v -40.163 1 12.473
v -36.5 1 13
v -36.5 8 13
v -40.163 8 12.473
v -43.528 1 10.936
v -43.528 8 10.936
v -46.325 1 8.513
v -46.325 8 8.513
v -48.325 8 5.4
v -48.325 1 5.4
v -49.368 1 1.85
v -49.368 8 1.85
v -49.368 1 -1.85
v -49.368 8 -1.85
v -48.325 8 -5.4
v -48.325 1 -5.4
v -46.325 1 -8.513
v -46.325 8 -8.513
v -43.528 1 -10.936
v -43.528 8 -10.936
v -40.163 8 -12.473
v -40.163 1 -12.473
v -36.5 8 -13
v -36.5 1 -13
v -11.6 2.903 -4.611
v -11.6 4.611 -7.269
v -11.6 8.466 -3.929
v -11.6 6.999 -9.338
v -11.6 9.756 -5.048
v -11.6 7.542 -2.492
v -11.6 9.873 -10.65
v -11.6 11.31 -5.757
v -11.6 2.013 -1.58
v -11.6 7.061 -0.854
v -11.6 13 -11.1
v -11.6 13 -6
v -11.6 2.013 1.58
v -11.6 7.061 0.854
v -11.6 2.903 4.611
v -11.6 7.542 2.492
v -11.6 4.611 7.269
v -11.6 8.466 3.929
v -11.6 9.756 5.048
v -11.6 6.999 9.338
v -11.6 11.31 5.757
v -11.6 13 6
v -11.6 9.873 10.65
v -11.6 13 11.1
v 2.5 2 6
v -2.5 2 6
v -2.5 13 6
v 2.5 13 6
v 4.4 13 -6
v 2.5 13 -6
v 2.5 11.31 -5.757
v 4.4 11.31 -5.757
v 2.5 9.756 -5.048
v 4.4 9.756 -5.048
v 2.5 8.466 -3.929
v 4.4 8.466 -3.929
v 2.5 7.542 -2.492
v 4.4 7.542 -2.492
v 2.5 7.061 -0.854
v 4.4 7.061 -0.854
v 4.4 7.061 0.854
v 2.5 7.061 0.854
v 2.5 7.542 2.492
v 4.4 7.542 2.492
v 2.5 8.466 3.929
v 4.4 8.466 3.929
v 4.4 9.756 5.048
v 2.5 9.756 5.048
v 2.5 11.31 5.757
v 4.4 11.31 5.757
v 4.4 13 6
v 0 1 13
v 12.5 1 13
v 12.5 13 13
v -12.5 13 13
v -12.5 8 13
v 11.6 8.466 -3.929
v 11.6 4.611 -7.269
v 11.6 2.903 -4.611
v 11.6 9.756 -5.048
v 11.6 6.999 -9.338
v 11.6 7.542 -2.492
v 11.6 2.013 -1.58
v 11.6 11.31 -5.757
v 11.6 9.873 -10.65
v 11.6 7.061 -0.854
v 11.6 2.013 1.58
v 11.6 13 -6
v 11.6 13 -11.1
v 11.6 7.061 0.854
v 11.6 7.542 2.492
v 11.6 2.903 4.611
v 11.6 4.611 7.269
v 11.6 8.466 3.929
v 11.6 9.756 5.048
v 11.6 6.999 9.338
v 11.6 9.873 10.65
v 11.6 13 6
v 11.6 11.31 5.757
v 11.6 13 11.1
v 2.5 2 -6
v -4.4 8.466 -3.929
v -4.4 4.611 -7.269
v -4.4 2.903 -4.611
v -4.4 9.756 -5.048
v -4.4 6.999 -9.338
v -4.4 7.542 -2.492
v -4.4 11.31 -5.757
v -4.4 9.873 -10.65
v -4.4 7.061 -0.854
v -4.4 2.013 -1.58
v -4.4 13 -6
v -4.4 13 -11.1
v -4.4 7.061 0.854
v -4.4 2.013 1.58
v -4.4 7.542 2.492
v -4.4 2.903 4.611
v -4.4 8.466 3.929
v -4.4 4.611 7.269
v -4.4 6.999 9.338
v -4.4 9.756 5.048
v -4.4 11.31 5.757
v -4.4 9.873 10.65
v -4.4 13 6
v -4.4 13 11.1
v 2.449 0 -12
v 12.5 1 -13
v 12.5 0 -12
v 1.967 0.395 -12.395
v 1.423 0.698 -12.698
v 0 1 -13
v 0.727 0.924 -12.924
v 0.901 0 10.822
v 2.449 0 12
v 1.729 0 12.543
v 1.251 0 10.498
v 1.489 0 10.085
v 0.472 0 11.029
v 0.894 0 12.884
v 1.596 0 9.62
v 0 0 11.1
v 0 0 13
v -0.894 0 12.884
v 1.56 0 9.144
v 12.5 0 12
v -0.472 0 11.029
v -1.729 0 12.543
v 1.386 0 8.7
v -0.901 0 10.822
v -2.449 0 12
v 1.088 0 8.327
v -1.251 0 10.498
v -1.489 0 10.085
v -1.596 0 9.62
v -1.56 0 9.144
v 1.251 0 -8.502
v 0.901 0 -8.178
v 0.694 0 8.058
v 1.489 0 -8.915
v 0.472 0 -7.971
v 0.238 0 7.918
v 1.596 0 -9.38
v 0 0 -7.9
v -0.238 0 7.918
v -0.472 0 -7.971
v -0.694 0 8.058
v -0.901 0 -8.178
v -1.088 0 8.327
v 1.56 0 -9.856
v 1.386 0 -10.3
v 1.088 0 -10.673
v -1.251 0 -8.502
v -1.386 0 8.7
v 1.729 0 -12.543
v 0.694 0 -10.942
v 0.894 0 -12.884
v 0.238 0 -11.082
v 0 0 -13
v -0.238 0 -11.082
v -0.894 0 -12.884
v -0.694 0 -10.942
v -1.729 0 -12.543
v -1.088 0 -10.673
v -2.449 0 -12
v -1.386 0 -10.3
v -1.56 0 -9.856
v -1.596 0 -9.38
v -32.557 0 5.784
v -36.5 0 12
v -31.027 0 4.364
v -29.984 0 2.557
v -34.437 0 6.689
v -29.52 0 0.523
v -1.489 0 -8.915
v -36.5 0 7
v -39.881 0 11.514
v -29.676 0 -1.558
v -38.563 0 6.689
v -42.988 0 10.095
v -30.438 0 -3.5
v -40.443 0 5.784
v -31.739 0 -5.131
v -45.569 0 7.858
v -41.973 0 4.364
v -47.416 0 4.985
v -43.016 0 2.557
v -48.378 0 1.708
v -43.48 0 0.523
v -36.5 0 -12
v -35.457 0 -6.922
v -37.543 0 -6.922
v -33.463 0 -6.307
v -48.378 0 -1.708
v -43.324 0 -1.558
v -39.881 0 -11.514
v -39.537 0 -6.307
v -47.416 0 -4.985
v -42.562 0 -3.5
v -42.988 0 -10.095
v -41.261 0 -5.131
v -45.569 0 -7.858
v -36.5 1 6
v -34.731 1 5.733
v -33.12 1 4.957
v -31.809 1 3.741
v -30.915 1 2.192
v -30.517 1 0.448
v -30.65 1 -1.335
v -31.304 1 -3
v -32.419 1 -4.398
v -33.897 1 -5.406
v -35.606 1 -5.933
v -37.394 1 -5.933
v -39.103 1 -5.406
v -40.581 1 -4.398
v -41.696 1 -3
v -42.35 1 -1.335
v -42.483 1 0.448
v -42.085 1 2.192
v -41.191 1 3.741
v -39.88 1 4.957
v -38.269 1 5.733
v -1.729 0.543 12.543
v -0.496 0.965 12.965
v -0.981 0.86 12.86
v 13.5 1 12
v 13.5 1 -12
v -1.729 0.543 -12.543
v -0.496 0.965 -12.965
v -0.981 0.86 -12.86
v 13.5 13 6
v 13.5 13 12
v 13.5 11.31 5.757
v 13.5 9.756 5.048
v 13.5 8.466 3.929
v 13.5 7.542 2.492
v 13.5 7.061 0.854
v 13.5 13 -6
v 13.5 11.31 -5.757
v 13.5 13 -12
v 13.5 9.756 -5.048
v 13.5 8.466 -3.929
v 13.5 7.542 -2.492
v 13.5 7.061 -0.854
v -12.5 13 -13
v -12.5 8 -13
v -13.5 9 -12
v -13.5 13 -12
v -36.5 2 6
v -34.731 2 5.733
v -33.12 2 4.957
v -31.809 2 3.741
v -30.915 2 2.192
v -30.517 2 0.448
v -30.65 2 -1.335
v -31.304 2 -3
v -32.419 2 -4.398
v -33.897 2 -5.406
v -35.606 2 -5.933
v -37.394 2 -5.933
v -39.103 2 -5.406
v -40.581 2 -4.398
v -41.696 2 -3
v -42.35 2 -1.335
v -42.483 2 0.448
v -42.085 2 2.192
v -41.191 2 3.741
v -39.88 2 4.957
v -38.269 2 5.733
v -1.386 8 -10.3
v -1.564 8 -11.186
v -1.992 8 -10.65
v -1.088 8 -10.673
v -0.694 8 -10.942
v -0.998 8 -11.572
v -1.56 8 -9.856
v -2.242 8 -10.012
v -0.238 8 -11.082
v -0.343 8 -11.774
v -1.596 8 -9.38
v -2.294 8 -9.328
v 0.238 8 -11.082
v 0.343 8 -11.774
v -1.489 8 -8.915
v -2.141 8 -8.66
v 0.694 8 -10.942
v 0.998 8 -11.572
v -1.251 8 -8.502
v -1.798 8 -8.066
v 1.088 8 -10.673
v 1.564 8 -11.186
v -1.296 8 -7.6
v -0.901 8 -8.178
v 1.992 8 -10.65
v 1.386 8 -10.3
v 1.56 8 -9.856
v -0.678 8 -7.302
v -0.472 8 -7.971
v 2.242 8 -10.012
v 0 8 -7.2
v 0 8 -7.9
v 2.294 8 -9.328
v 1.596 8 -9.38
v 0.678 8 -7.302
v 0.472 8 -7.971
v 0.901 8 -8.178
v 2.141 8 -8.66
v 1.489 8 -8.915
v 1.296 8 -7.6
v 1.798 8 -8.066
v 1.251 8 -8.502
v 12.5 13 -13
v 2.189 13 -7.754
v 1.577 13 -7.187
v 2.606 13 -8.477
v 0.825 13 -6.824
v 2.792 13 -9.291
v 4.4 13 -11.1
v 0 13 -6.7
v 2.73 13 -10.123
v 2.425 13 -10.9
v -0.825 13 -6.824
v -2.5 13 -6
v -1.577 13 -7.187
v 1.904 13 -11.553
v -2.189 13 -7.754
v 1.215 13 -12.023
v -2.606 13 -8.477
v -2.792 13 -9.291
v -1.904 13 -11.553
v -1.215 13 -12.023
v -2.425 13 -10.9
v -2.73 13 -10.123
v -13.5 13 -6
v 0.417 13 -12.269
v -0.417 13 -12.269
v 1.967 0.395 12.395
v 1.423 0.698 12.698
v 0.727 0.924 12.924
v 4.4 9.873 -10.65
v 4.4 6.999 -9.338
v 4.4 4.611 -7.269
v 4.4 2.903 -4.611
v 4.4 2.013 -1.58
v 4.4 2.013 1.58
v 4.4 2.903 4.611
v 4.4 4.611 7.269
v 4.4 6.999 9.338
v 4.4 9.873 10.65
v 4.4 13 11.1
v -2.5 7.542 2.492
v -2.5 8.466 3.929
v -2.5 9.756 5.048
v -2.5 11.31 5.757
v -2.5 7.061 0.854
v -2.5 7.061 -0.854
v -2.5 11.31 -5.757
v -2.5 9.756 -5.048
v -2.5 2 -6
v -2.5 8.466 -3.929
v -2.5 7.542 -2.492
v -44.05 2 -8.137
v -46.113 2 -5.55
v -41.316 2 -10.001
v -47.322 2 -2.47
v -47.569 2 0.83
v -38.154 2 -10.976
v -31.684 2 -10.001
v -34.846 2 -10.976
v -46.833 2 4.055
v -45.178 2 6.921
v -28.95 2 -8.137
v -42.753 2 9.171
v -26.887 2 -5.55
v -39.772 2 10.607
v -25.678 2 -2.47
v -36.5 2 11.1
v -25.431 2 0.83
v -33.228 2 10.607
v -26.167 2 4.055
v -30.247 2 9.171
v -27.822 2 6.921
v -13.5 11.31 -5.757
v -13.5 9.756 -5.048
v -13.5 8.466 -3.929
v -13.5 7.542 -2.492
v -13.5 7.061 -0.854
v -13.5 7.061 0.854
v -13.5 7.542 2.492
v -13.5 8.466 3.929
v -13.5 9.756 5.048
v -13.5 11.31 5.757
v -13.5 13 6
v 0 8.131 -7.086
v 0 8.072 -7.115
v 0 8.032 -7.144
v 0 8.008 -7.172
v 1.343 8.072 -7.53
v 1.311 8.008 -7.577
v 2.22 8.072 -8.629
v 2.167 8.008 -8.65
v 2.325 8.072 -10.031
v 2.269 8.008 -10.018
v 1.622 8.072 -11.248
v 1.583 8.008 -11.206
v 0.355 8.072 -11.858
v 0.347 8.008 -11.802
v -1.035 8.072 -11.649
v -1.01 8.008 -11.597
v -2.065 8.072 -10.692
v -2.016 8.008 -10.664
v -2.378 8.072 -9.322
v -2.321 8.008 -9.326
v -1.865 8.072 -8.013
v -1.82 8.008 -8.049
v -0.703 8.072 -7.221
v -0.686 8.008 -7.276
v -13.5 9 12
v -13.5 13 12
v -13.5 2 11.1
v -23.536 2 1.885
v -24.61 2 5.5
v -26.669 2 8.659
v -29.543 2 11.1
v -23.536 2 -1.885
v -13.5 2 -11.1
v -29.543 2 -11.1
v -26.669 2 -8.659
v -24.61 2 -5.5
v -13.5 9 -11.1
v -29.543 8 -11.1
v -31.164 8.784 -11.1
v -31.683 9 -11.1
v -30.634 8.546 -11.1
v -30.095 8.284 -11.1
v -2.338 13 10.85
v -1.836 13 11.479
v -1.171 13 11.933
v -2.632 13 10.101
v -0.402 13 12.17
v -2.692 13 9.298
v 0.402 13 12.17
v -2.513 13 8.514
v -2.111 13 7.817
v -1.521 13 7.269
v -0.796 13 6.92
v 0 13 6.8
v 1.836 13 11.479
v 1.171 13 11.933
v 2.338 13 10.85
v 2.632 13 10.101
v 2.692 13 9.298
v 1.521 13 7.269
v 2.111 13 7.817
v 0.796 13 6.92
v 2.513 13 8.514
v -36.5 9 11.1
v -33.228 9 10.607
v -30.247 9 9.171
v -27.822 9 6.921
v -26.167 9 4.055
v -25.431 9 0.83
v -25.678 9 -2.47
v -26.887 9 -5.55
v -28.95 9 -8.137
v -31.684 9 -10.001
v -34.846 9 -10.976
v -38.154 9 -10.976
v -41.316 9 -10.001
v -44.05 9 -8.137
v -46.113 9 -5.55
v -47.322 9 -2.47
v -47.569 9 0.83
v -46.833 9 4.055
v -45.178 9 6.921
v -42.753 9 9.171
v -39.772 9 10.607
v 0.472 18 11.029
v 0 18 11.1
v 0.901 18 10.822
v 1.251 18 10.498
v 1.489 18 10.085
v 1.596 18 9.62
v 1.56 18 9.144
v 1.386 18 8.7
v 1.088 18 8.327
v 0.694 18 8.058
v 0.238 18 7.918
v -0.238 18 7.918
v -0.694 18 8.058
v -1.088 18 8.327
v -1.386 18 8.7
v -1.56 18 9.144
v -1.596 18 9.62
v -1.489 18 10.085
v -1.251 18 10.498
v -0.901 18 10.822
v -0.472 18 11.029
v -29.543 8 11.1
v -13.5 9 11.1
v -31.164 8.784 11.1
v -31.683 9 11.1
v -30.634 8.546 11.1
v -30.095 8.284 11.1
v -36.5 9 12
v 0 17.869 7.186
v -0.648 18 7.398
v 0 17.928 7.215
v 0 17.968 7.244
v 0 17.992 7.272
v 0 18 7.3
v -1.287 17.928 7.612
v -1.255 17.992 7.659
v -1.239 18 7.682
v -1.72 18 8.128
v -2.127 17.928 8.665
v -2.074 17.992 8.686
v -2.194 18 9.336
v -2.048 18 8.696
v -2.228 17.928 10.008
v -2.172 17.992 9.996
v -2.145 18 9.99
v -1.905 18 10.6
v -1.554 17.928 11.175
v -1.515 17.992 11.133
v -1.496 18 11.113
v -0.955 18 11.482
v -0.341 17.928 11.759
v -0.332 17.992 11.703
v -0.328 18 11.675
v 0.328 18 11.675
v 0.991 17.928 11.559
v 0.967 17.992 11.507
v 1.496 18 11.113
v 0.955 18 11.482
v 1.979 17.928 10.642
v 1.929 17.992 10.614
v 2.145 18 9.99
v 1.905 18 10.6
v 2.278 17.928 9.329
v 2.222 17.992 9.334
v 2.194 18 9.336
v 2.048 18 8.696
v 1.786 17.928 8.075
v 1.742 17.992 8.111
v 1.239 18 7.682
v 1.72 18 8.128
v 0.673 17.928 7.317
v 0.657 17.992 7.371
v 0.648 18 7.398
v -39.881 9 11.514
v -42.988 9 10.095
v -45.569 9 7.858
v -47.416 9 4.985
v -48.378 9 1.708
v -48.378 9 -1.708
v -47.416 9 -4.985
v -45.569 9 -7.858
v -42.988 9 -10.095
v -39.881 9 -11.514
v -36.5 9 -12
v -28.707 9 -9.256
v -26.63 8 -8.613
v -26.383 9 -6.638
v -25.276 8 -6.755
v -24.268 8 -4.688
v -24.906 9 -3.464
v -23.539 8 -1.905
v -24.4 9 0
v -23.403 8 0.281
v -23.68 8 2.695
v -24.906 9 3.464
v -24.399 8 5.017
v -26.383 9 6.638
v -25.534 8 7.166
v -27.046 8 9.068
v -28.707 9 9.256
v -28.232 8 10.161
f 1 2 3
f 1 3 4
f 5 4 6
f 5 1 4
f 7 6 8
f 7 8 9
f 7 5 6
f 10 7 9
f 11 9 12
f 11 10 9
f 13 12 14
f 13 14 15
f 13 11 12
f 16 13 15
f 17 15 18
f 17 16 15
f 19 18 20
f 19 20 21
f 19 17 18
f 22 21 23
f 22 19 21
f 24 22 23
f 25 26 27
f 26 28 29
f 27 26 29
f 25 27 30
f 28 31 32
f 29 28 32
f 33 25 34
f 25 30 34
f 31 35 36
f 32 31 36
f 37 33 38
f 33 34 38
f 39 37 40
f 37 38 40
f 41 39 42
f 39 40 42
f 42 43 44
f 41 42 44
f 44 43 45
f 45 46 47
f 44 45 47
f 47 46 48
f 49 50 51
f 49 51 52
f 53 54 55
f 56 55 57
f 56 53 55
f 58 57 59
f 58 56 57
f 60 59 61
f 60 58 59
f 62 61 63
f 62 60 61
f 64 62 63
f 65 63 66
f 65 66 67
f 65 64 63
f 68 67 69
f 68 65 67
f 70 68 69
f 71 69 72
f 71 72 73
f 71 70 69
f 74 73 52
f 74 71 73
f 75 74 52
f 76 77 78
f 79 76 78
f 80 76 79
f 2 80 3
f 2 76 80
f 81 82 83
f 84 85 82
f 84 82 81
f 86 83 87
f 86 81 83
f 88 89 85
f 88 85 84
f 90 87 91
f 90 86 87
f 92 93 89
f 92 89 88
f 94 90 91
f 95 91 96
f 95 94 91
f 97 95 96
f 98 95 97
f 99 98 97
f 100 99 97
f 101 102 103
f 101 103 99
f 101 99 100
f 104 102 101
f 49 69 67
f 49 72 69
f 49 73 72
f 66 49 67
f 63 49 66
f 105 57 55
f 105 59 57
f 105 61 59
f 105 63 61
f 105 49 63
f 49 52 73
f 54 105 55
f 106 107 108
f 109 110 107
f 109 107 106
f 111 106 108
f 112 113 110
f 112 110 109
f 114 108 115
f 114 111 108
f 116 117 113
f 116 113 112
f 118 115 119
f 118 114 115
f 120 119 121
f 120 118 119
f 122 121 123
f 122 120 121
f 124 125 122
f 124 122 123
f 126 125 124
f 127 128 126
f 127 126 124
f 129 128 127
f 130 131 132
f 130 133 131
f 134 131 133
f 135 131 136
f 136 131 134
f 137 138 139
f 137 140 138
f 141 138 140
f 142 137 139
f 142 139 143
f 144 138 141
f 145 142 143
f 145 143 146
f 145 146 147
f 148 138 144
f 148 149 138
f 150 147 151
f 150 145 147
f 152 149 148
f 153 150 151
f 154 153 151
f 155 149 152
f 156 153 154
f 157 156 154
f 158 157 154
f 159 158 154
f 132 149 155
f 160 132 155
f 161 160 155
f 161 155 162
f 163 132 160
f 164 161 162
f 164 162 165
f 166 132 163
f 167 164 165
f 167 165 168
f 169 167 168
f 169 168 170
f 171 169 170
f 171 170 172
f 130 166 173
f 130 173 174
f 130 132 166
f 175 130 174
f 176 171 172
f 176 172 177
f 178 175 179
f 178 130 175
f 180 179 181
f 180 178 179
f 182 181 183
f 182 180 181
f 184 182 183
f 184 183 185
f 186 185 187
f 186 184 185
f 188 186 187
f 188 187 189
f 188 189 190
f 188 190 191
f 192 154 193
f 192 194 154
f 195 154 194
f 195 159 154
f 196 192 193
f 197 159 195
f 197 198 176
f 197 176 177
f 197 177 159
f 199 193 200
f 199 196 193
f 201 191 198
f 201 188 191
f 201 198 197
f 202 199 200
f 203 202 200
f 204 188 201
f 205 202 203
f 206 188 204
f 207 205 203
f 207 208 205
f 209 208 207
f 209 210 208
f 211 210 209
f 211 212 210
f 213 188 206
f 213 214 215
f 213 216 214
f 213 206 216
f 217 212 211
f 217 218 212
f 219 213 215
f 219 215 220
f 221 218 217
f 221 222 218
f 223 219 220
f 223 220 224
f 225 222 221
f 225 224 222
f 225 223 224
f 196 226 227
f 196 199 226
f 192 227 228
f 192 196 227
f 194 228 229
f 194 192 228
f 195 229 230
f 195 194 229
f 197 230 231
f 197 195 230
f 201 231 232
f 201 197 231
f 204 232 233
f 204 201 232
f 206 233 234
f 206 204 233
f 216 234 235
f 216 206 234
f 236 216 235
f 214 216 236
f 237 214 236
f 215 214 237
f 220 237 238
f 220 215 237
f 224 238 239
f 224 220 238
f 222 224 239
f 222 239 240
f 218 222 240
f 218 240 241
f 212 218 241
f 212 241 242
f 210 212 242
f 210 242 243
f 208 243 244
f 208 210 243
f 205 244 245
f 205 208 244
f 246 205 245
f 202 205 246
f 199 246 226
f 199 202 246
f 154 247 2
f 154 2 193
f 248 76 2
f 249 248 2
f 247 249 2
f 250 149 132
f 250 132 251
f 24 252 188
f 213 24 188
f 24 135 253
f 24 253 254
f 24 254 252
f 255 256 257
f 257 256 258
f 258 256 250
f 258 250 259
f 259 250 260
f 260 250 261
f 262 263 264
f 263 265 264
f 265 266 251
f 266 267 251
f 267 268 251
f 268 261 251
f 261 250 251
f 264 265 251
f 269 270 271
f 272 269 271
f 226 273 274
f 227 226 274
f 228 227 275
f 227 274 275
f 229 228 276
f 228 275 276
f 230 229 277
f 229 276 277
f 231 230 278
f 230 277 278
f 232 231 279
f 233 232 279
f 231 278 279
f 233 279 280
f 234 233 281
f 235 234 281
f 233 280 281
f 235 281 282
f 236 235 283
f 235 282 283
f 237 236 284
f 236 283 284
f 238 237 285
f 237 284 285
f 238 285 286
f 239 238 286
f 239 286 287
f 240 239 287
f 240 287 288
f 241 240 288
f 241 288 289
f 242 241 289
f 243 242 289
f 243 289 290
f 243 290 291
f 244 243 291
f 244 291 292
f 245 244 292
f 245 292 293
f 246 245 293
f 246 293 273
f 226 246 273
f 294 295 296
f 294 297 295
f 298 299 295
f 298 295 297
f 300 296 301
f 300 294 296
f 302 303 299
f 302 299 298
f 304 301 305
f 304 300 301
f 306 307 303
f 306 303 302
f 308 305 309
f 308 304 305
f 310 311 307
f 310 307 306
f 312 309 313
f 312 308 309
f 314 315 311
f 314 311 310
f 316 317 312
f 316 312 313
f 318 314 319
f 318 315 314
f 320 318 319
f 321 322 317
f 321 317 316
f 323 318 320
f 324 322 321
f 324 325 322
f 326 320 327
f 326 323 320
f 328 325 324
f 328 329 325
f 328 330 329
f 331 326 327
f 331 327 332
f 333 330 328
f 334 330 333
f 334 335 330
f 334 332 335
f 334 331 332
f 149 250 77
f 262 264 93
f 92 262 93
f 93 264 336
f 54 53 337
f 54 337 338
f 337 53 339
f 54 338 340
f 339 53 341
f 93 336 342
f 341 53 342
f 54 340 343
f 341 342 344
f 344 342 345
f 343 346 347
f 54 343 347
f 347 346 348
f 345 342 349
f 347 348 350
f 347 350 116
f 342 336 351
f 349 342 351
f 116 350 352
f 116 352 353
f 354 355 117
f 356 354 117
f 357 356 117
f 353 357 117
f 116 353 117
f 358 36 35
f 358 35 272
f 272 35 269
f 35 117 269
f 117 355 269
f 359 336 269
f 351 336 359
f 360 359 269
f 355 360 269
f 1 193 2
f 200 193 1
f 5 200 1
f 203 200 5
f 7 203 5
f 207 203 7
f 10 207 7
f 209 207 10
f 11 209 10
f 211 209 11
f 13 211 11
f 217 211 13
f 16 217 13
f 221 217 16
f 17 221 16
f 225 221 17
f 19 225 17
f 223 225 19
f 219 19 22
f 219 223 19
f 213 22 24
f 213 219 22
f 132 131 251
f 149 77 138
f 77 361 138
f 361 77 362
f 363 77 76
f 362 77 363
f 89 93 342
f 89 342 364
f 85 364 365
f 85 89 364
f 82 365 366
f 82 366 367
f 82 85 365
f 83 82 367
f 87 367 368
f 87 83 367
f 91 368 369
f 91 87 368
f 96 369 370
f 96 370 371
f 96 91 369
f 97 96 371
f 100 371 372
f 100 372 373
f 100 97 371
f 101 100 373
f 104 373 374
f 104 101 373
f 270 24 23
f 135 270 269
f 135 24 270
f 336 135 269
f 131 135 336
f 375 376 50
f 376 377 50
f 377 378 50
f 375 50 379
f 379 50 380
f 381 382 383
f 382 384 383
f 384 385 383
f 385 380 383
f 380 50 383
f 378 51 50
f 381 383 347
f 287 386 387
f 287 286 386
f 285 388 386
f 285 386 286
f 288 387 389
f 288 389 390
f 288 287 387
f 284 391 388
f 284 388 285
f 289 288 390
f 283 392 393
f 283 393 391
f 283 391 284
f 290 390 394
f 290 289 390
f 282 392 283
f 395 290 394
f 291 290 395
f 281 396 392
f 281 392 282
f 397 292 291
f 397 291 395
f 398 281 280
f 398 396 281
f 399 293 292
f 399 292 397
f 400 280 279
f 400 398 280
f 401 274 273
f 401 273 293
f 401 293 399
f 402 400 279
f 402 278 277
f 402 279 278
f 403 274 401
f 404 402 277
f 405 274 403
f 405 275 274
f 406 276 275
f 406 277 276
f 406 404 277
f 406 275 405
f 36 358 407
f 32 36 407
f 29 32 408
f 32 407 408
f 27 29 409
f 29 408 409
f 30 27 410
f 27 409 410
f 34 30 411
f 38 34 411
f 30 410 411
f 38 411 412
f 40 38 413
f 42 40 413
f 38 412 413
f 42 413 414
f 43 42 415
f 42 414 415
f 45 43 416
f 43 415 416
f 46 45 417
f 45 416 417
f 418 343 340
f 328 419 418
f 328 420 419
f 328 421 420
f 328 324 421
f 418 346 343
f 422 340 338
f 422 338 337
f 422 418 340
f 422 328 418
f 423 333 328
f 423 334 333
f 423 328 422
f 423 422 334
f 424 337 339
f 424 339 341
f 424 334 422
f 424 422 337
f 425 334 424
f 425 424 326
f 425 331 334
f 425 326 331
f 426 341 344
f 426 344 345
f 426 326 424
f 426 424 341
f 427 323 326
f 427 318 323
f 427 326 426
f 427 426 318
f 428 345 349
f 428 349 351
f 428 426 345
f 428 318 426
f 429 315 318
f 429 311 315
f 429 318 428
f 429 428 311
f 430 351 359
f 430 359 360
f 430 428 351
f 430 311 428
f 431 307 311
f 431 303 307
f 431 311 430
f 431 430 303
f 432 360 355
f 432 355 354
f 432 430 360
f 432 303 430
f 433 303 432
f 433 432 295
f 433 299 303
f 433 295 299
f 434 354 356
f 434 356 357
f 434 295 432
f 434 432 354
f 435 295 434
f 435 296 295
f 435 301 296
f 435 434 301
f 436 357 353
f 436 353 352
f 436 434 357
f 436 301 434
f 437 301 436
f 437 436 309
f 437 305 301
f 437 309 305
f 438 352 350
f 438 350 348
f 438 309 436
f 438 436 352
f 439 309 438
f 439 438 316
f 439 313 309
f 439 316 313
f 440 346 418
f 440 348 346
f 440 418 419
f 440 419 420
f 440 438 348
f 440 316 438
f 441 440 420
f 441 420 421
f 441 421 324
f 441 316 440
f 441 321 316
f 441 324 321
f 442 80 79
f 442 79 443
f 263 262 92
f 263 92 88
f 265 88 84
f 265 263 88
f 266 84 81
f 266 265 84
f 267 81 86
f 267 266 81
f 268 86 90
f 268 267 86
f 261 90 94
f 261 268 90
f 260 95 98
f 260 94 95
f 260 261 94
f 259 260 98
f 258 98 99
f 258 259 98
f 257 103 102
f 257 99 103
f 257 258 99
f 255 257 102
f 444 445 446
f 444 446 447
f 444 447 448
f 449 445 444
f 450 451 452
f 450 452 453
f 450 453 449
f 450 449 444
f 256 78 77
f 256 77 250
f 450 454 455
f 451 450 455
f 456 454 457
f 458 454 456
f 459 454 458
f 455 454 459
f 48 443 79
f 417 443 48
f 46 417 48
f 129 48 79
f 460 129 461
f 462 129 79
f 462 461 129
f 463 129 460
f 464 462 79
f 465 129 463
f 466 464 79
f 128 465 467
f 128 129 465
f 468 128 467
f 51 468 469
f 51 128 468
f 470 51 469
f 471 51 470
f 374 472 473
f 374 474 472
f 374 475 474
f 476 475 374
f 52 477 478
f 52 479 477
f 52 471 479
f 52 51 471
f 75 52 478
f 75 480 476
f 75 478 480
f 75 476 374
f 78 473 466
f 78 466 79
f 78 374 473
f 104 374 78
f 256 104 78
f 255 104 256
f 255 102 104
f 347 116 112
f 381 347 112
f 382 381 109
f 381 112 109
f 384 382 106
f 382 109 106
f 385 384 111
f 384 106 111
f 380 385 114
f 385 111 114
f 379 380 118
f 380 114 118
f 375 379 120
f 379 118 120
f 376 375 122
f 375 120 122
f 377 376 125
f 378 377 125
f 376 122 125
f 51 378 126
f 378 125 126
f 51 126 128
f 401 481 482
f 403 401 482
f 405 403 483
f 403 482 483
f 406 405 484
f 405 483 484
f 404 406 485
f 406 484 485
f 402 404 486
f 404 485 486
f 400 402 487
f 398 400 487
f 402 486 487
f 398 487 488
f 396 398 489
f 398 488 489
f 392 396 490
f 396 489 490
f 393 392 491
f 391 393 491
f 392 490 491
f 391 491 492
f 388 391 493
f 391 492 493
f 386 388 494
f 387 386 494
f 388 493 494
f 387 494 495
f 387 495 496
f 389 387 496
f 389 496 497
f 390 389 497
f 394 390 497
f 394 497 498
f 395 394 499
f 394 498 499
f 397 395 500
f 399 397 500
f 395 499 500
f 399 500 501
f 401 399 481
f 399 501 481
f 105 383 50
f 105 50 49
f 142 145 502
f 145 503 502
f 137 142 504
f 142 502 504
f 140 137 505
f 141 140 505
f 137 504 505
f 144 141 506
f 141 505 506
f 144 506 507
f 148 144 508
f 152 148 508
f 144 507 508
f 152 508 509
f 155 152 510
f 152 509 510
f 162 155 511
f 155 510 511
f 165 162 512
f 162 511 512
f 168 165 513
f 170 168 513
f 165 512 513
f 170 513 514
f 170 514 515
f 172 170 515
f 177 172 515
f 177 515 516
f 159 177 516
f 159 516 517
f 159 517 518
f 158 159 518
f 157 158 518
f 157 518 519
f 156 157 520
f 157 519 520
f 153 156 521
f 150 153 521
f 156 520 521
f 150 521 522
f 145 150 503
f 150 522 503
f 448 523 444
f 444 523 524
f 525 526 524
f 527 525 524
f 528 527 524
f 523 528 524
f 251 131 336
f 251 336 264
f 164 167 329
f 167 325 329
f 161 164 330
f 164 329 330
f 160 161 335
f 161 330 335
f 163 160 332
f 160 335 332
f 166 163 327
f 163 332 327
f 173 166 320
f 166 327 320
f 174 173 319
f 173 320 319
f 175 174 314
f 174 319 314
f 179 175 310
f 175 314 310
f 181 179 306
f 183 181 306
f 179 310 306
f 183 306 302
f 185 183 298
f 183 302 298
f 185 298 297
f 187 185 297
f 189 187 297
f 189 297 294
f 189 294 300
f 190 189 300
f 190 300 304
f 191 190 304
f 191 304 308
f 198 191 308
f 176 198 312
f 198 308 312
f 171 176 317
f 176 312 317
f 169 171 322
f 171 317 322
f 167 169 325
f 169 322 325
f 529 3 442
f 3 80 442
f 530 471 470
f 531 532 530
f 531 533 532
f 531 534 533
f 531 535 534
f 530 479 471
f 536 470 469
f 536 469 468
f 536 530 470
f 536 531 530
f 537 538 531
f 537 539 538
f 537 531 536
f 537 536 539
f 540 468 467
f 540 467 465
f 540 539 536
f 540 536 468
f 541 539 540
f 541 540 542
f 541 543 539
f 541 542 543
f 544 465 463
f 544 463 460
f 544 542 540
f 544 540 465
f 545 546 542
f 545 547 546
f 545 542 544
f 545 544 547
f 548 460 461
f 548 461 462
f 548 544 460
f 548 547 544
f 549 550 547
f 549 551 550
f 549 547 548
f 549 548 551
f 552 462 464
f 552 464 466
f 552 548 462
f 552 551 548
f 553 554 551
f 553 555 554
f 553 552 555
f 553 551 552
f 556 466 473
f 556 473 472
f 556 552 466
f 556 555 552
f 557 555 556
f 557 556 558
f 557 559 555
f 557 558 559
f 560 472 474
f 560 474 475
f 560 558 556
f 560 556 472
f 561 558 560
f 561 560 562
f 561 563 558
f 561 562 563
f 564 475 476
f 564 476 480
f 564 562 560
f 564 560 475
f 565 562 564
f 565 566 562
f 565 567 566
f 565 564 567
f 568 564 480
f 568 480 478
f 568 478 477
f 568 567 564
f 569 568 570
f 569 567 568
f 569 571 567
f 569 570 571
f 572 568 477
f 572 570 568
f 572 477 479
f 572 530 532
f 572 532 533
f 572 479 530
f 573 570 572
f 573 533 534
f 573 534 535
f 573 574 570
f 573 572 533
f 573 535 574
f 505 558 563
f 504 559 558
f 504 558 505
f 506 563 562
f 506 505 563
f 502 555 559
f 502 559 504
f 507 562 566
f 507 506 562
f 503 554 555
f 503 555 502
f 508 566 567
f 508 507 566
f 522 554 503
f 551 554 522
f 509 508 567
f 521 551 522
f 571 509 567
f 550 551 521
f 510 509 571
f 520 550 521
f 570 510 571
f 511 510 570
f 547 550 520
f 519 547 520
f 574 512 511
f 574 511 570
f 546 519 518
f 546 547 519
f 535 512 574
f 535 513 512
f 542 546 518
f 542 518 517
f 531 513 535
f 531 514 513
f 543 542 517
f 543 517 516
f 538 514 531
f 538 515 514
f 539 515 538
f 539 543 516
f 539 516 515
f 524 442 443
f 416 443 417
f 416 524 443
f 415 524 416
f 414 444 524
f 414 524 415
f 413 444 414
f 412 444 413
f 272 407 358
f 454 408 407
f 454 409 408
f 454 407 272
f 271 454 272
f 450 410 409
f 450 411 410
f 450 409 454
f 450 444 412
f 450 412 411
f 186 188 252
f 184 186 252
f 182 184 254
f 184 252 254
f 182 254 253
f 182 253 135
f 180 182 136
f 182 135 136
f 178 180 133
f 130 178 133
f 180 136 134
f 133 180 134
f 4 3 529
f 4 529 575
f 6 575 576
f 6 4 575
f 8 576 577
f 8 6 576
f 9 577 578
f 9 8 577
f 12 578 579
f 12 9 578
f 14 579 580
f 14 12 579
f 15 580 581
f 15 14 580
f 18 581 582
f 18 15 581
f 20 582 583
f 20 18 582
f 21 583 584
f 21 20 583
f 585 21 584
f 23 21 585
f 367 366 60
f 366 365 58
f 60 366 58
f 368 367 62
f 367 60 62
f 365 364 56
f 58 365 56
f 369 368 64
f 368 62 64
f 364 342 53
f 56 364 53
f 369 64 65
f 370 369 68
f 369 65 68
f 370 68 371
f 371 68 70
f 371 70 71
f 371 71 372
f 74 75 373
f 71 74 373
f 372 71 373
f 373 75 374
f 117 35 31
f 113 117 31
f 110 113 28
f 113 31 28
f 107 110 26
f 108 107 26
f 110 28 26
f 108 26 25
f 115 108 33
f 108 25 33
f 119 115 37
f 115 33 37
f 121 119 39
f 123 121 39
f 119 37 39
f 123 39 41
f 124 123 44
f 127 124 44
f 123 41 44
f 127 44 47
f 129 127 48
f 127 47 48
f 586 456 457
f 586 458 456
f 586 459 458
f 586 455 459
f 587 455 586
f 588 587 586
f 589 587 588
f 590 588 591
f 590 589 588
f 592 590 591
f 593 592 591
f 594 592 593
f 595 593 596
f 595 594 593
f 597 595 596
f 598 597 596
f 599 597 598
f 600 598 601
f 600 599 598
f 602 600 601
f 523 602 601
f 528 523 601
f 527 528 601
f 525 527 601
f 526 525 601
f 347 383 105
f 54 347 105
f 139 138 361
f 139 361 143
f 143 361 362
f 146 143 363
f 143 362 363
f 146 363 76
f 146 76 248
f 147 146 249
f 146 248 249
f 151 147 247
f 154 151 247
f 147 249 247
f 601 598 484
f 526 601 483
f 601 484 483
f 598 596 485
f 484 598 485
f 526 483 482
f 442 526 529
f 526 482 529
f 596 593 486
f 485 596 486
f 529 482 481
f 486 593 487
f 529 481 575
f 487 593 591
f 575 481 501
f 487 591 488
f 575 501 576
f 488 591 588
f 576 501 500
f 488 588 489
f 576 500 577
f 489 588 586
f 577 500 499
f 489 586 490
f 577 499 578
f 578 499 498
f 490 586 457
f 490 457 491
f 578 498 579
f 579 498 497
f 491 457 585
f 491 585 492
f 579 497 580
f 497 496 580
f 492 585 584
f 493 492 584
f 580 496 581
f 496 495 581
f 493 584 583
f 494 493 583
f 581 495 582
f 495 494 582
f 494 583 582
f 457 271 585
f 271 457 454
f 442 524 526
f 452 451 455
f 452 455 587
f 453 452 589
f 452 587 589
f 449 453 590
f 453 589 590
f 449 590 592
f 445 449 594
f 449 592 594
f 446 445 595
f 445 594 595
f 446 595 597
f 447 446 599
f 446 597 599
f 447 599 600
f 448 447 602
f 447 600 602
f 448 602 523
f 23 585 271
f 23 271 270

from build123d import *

# Parameters (mm, degrees)
SKETCH1_W           = 27
SKETCH1_H           = 26
BOSS_EXTRUDE1_DEPTH = 2
SKETCH2_W           = 11
SKETCH2_H           = 26
BOSS_EXTRUDE2_DEPTH = 11
CUT_EXTRUDE1_DEPTH  = 3.6
CUT_EXTRUDE2_REACH  = 34.665
SKETCH13_W          = 5
SKETCH13_H          = 7
BOSS_EXTRUDE6_DEPTH = 11
SKETCH14_R          = 2.7
BOSS_EXTRUDE7_DEPTH = 5
SKETCH15_R          = 2.8
CUT_EXTRUDE7_DEPTH  = 5
SKETCH16_R          = 1.6
CUT_EXTRUDE8_DEPTH  = 26.98557292
BOSS_EXTRUDE5_DEPTH = 9
SKETCH10_R          = 11.1
CUT_EXTRUDE4_DEPTH  = 7
SKETCH11_R          = 6
CUT_EXTRUDE5_DEPTH  = 54.621357685
CUT_EXTRUDE6_DEPTH  = 7
BOSS_EXTRUDE9_START = -1
SKETCH17_R          = 3.5
SKETCH17_R_2        = 1.6
BOSS_EXTRUDE9_DEPTH = 1
FILLET1_SIZE        = 5
FILLET1_SIZE_2      = 0.5


with BuildPart() as part:
    # Sketch1 → Boss-Extrude1 (new body)
    with BuildSketch(Plane(origin=(0, 0, 0), x_dir=(1, 0, 0), z_dir=(0, 1, 0))):
        Rectangle(SKETCH1_W, SKETCH1_H)
    extrude(amount=BOSS_EXTRUDE1_DEPTH)

    # Sketch2 → Boss-Extrude2 (add)
    with BuildSketch(Plane(origin=(0, 2, 0), x_dir=(1, 0, 0), z_dir=(0, 1, 0))):
        with Locations((-8, 0)):
            Rectangle(SKETCH2_W, SKETCH2_H)
    boss_extrude2 = extrude(amount=BOSS_EXTRUDE2_DEPTH)

    # Sketch3 → Cut-Extrude1 (cut, symmetric)
    with BuildSketch(Plane.ZY.offset(8)):
        with BuildLine():
            Line((11.1, 13), (-11.1, 13))
            ThreePointArc((-11.1, 13), (0, 1.9), (11.1, 13))
        make_face()
    cut_extrude1 = extrude(amount=CUT_EXTRUDE1_DEPTH, both=True, mode=Mode.SUBTRACT)

    # Cut-Extrude2: up to this face of the body (flat: up to its plane)
    cut_extrude2_end = Plane(part.part.faces().sort_by_distance((-2.5, 7.5, 0))[0])
    # Sketch4 → Cut-Extrude2 (cut, up to the picked face)
    with BuildSketch(Plane.ZY.offset(13.5), mode=Mode.PRIVATE) as cut_extrude2_sk1:
        with BuildLine():
            Line((6, 13), (-6, 13))
            ThreePointArc((-6, 13), (0, 7), (6, 13))
        make_face()
    cut_extrude2_tool1 = split(extrude(cut_extrude2_sk1.sketch, amount=-CUT_EXTRUDE2_REACH, mode=Mode.PRIVATE), bisect_by=cut_extrude2_end, keep=Keep.BOTH, mode=Mode.PRIVATE)
    cut_extrude2 = cut_extrude2_tool1.solids().sort_by(Axis((-13.5, 10.453521, 0), (1, 0, 0)))[0]
    add(cut_extrude2, mode=Mode.SUBTRACT)

    # Mirror3: Boss-Extrude2, Cut-Extrude1, Cut-Extrude2 across plane
    add(boss_extrude2.mirror(Plane(origin=(0, 0, 0), x_dir=(0, 0, 1), z_dir=(1, 0, 0))))
    add(cut_extrude1.mirror(Plane(origin=(0, 0, 0), x_dir=(0, 0, 1), z_dir=(1, 0, 0))), mode=Mode.SUBTRACT)
    add(cut_extrude2.mirror(Plane(origin=(0, 0, 0), x_dir=(0, 0, 1), z_dir=(1, 0, 0))), mode=Mode.SUBTRACT)

    # Sketch13 → Boss-Extrude6 (add)
    with BuildSketch(Plane(origin=(0, 2, 0), x_dir=(1, 0, 0), z_dir=(0, 1, 0))):
        with Locations((0, -9.5)):
            Rectangle(SKETCH13_W, SKETCH13_H)
        with Locations((0, 9.5)):
            Rectangle(SKETCH13_W, SKETCH13_H)
    extrude(amount=BOSS_EXTRUDE6_DEPTH)

    # Sketch14 → Boss-Extrude7 (add)
    with BuildSketch(Plane(origin=(0, 13, 0), x_dir=(1, 0, 0), z_dir=(0, 1, 0))):
        with Locations(Location((0, -9.5, 0), (0, 0, 90))):
            Circle(SKETCH14_R)
    extrude(amount=BOSS_EXTRUDE7_DEPTH)

    # Sketch15 → Cut-Extrude7 (cut)
    with BuildSketch(Plane(origin=(0, 13, 0), x_dir=(1, 0, 0), z_dir=(0, 1, 0))):
        with Locations(Location((0, 9.5, 0), (0, 0, 270))):
            Circle(SKETCH15_R)
    extrude(amount=-CUT_EXTRUDE7_DEPTH, mode=Mode.SUBTRACT)

    # Sketch16 → Cut-Extrude8 (cut, through all)
    with BuildSketch(Plane(origin=(0, 18, 0), x_dir=(1, 0, 0), z_dir=(0, 1, 0))):
        with Locations(Location((0, -9.5, 0), (0, 0, 270))):
            Circle(SKETCH16_R)
        with Locations(Location((0, 9.5, 0), (0, 0, 270))):
            Circle(SKETCH16_R)
    extrude(amount=-CUT_EXTRUDE8_DEPTH, mode=Mode.SUBTRACT)

    # Sketch9 → Boss-Extrude5 (add)
    with BuildSketch(Plane(origin=(0, 0, 0), x_dir=(1, 0, 0), z_dir=(0, 1, 0))):
        with BuildLine():
            Line((-13.5, 13), (-13.5, -13))
            Line((-13.5, -13), (-36.5, -13))
            ThreePointArc((-36.5, -13), (-49.5, 0), (-36.5, 13))
            Line((-36.5, 13), (-13.5, 13))
        make_face()
    extrude(amount=BOSS_EXTRUDE5_DEPTH)

    # Sketch10 → Cut-Extrude4 (cut)
    with BuildSketch(Plane(origin=(0, 9, 0), x_dir=(1, 0, 0), z_dir=(0, 1, 0))):
        with Locations(Location((-36.5, 0, 0), (0, 0, 270))):
            Circle(SKETCH10_R)
    extrude(amount=-CUT_EXTRUDE4_DEPTH, mode=Mode.SUBTRACT)

    # Sketch11 → Cut-Extrude5 (cut, through all)
    with BuildSketch(Plane(origin=(0, 2, 0), x_dir=(1, 0, 0), z_dir=(0, 1, 0))):
        with Locations(Location((-36.5, 0, 0), (0, 0, 270))):
            Circle(SKETCH11_R)
    extrude(amount=-CUT_EXTRUDE5_DEPTH, mode=Mode.SUBTRACT)

    # Sketch12 → Cut-Extrude6 (cut)
    with BuildSketch(Plane(origin=(0, 9, 0), x_dir=(1, 0, 0), z_dir=(0, 1, 0))):
        with BuildLine():
            Line((-29.542989148, -11.1), (-13.5, -11.1))
            Line((-13.5, -11.1), (-13.5, 11.1))
            Line((-13.5, 11.1), (-29.542989148, 11.1))
            ThreePointArc((-29.542989148, 11.1), (-23.4, 0), (-29.542989148, -11.1))
        make_face()
    extrude(amount=-CUT_EXTRUDE6_DEPTH, mode=Mode.SUBTRACT)

    # Chamfer4
    # the kernel refuses this chamfer: 1 mm, written as the material it takes off along each edge
    with BuildSketch(Plane(origin=(12.833333333, 0.666666667, 12.333333333), x_dir=(0.7071067811865475, 0, -0.7071067811865475), z_dir=(0.5773502691896257, -0.5773502691896258, 0.5773502691896257)), Plane(origin=(12.833333333, 0.666666667, -12.333333333), x_dir=(-0.7071067811865475, 0, -0.7071067811865475), z_dir=(0.5773502691896257, -0.5773502691896258, -0.5773502691896257))) as chamfer4_piece_1:
        Polygon((-0.707106781, 0.40824829), (0.707106781, 0.40824829), (0, -0.816496581), align=None)
    extrude(amount=1.270170592, mode=Mode.SUBTRACT)
    with BuildSketch(Plane(origin=(-36.5, 0, 0), x_dir=(0, 0, 1), z_dir=(1, 0, 0))) as chamfer4_piece_2:
        with BuildLine():
            Line((13.028284271, -1.028284271), (11.971715729, 0.028284271))
            Line((11.971715729, 0.028284271), (11.971715729, 0.048284271))
            ThreePointArc((11.971715729, 0.048284271), (12.485857864, 0.02), (13, 0.02))
            Line((13, 0.02), (13.02, 0))
            ThreePointArc((13.02, 0), (13.02, -0.514142136), (13.048284271, -1.028284271))
            Line((13.048284271, -1.028284271), (13.028284271, -1.028284271))
        make_face()
    revolve(axis=Axis((-36.5, 0, 0), (0, -1, 0)), revolution_arc=180, mode=Mode.SUBTRACT)
    with BuildSketch(Plane(origin=(-13.5, 9, 13), x_dir=(0, -0.9996219169112968, 0.027495876610585623), z_dir=(-1, 0, 0))) as chamfer4_piece_3:
        with BuildLine():
            Line((1.028673195, 0), (-0.056547155, -1.027117794))
            Line((-0.056547155, -1.027117794), (-0.076539593, -1.026567876))
            ThreePointArc((-0.076539593, -1.026567876), (-0.034129227, -0.51339783), (-0.019992438, 0.000549918))
            Line((-0.019992438, 0.000549918), (0.000549918, 0.019992438))
            ThreePointArc((0.000549918, 0.019992438), (0.514497665, 0.00585565), (1.029223113, 0.019992438))
            Line((1.029223113, 0.019992438), (1.028673195, 0))
        make_face()
    extrude(amount=23, mode=Mode.SUBTRACT)
    with BuildSketch(Plane(origin=(-36.5, 9, -13), x_dir=(0, 0.027495876610585647, 0.9996219169112968), z_dir=(1, 0, 0))) as chamfer4_piece_4:
        with BuildLine():
            Line((1.028673195, 0), (-0.056547155, 1.027117794))
            Line((-0.056547155, 1.027117794), (-0.076539593, 1.026567876))
            ThreePointArc((-0.076539593, 1.026567876), (-0.034129227, 0.51339783), (-0.019992438, -0.000549918))
            Line((-0.019992438, -0.000549918), (0.000549918, -0.019992438))
            ThreePointArc((0.000549918, -0.019992438), (0.514497665, -0.00585565), (1.029223113, -0.019992438))
            Line((1.029223113, -0.019992438), (1.028673195, 0))
        make_face()
    extrude(amount=23, mode=Mode.SUBTRACT)
    with BuildSketch(Plane(origin=(-36.5, 9, 0), x_dir=(0, 0, 1), z_dir=(1, 0, 0))) as chamfer4_piece_5:
        with BuildLine():
            Line((11.971715729, -0.028284271), (13.028284271, 1.028284271))
            Line((13.028284271, 1.028284271), (13.048284271, 1.028284271))
            ThreePointArc((13.048284271, 1.028284271), (13.02, 0.514142136), (13.02, 0))
            Line((13.02, 0), (13, -0.02))
            ThreePointArc((13, -0.02), (12.485857864, -0.02), (11.971715729, -0.048284271))
            Line((11.971715729, -0.048284271), (11.971715729, -0.028284271))
        make_face()
    revolve(axis=Axis((-36.5, 9, 0), (0, -1, 0)), revolution_arc=180, mode=Mode.SUBTRACT)
    with BuildSketch(Plane(origin=(-36.5, 0, 0), x_dir=(0, 0, 1), z_dir=(-1, 0, 0))) as chamfer4_piece_6:
        with BuildLine():
            Line((5.971715729, 1.028284271), (7.028284271, -0.028284271))
            Line((7.028284271, -0.028284271), (7.028284271, -0.048284271))
            ThreePointArc((7.028284271, -0.048284271), (6.514142136, -0.02), (6, -0.02))
            Line((6, -0.02), (5.98, 0))
            ThreePointArc((5.98, 0), (5.98, 0.514142136), (5.951715729, 1.028284271))
            Line((5.951715729, 1.028284271), (5.971715729, 1.028284271))
        make_face()
    revolve(axis=Axis((-36.5, 0, 0), (0, 1, 0)), mode=Mode.SUBTRACT)
    with BuildSketch(Plane(origin=(-36.5, 9, 0), x_dir=(0.35547288647586206, 0, -0.934686592917925), z_dir=(-0.934686592917925, 0, -0.35547288647586206))) as chamfer4_piece_7_section:
        with BuildLine():
            Line((12.071715729, -0.028284271), (13.128284271, 1.028284271))
            Line((13.128284271, 1.028284271), (13.148284271, 1.028284271))
            ThreePointArc((13.148284271, 1.028284271), (13.12, 0.514142136), (13.12, 0))
            Line((13.12, 0), (13.1, -0.02))
            ThreePointArc((13.1, -0.02), (12.585857864, -0.02), (12.071715729, -0.048284271))
            Line((12.071715729, -0.048284271), (12.071715729, -0.028284271))
        make_face()
    chamfer4_piece_7 = revolve(axis=Axis((-36.5, 9, 0), (0, -1, 0)), revolution_arc=138.355141446, mode=Mode.PRIVATE)
    chamfer4_piece_7 = split(chamfer4_piece_7, bisect_by=Plane(origin=(-23.882630436, 8.517369564, -11.1), z_dir=(0, 0, 1)), keep=Keep.TOP, mode=Mode.PRIVATE)
    chamfer4_piece_7 = split(chamfer4_piece_7, bisect_by=Plane(origin=(-23.882630436, 8.517369564, 11.1), z_dir=(0, 0, -1)), keep=Keep.TOP, mode=Mode.PRIVATE)
    add(chamfer4_piece_7, mode=Mode.SUBTRACT)
    with BuildSketch(Plane(origin=(-36.5, 0, 13), x_dir=(0, 0.999621916911297, 0.02749587661058045), z_dir=(1, 0, 0))) as chamfer4_piece_8:
        with BuildLine():
            Line((1.028673195, 0), (-0.056547155, -1.027117794))
            Line((-0.056547155, -1.027117794), (-0.076539593, -1.026567876))
            ThreePointArc((-0.076539593, -1.026567876), (-0.034129227, -0.51339783), (-0.019992438, 0.000549918))
            Line((-0.019992438, 0.000549918), (0.000549918, 0.019992438))
            ThreePointArc((0.000549918, 0.019992438), (0.514497665, 0.00585565), (1.029223113, 0.019992438))
            Line((1.029223113, 0.019992438), (1.028673195, 0))
        make_face()
    extrude(amount=52.571682988, mode=Mode.SUBTRACT)
    with BuildSketch(Plane(origin=(-36.5, 0, -13), x_dir=(0, 0.9996219169112965, -0.027495876610590803), z_dir=(1, 0, 0))) as chamfer4_piece_9:
        with BuildLine():
            Line((1.028673195, 0), (-0.056547155, 1.027117794))
            Line((-0.056547155, 1.027117794), (-0.076539593, 1.026567876))
            ThreePointArc((-0.076539593, 1.026567876), (-0.034129227, 0.51339783), (-0.019992438, -0.000549918))
            Line((-0.019992438, -0.000549918), (0.000549918, -0.019992438))
            ThreePointArc((0.000549918, -0.019992438), (0.514497665, -0.00585565), (1.029223113, -0.019992438))
            Line((1.029223113, -0.019992438), (1.028673195, 0))
        make_face()
    extrude(amount=52.571682988, mode=Mode.SUBTRACT)
    with BuildSketch(Plane(origin=(13.5, 0, 15.571682988), x_dir=(-0.9996219169112968, -0.02749587661058639, 0), z_dir=(0, 0, -1))) as chamfer4_piece_10:
        with BuildLine():
            Line((1.028673195, 0), (-0.056547155, 1.027117794))
            Line((-0.056547155, 1.027117794), (-0.076539593, 1.026567876))
            ThreePointArc((-0.076539593, 1.026567876), (-0.034129227, 0.51339783), (-0.019992438, -0.000549918))
            Line((-0.019992438, -0.000549918), (0.000549918, -0.019992438))
            ThreePointArc((0.000549918, -0.019992438), (0.514497665, -0.00585565), (1.029223113, -0.019992438))
            Line((1.029223113, -0.019992438), (1.028673195, 0))
        make_face()
    extrude(amount=31.143365976, mode=Mode.SUBTRACT)
    with BuildSketch(Plane(origin=(13.5, -2.571682988, 13), x_dir=(-0.9996219169112968, 0, 0.027495876610585647), z_dir=(0, 1, 0))) as chamfer4_piece_11:
        with BuildLine():
            Line((1.028673195, 0), (-0.056547155, -1.027117794))
            Line((-0.056547155, -1.027117794), (-0.076539593, -1.026567876))
            ThreePointArc((-0.076539593, -1.026567876), (-0.034129227, -0.51339783), (-0.019992438, 0.000549918))
            Line((-0.019992438, 0.000549918), (0.000549918, 0.019992438))
            ThreePointArc((0.000549918, 0.019992438), (0.514497665, 0.00585565), (1.029223113, 0.019992438))
            Line((1.029223113, 0.019992438), (1.028673195, 0))
        make_face()
    extrude(amount=18.143365976, mode=Mode.SUBTRACT)
    with BuildSketch(Plane(origin=(-13.5, 15.571682988, 13), x_dir=(0.9996219169112968, 0, 0.027495876610585647), z_dir=(0, -1, 0))) as chamfer4_piece_12:
        with BuildLine():
            Line((1.028673195, 0), (-0.056547155, -1.027117794))
            Line((-0.056547155, -1.027117794), (-0.076539593, -1.026567876))
            ThreePointArc((-0.076539593, -1.026567876), (-0.034129227, -0.51339783), (-0.019992438, 0.000549918))
            Line((-0.019992438, 0.000549918), (0.000549918, 0.019992438))
            ThreePointArc((0.000549918, 0.019992438), (0.514497665, 0.00585565), (1.029223113, 0.019992438))
            Line((1.029223113, 0.019992438), (1.028673195, 0))
        make_face()
    extrude(amount=6.571682988, mode=Mode.SUBTRACT)
    with BuildSketch(Plane(origin=(-13.5, 15.571682988, -13), x_dir=(0.9996219169112968, 0, -0.027495876610585647), z_dir=(0, -1, 0))) as chamfer4_piece_13:
        with BuildLine():
            Line((1.028673195, 0), (-0.056547155, 1.027117794))
            Line((-0.056547155, 1.027117794), (-0.076539593, 1.026567876))
            ThreePointArc((-0.076539593, 1.026567876), (-0.034129227, 0.51339783), (-0.019992438, -0.000549918))
            Line((-0.019992438, -0.000549918), (0.000549918, -0.019992438))
            ThreePointArc((0.000549918, -0.019992438), (0.514497665, -0.00585565), (1.029223113, -0.019992438))
            Line((1.029223113, -0.019992438), (1.028673195, 0))
        make_face()
    extrude(amount=6.571682988, mode=Mode.SUBTRACT)
    with BuildSketch(Plane(origin=(13.5, -2.571682988, -13), x_dir=(-0.9996219169112968, 0, -0.027495876610585647), z_dir=(0, 1, 0))) as chamfer4_piece_14:
        with BuildLine():
            Line((1.028673195, 0), (-0.056547155, 1.027117794))
            Line((-0.056547155, 1.027117794), (-0.076539593, 1.026567876))
            ThreePointArc((-0.076539593, 1.026567876), (-0.034129227, 0.51339783), (-0.019992438, -0.000549918))
            Line((-0.019992438, -0.000549918), (0.000549918, -0.019992438))
            ThreePointArc((0.000549918, -0.019992438), (0.514497665, -0.00585565), (1.029223113, -0.019992438))
            Line((1.029223113, -0.019992438), (1.028673195, 0))
        make_face()
    extrude(amount=18.143365976, mode=Mode.SUBTRACT)
    with BuildSketch(Plane(origin=(-13.5, 15.571682988, 13), x_dir=(0.9996219169112968, 0, 0.027495876610585647), z_dir=(0, -1, 0))) as chamfer4_piece_15a_section:
        with BuildLine():
            Line((1.028673195, 0), (-0.056547155, -1.027117794))
            Line((-0.056547155, -1.027117794), (-0.076539593, -1.026567876))
            ThreePointArc((-0.076539593, -1.026567876), (-0.034129227, -0.51339783), (-0.019992438, 0.000549918))
            Line((-0.019992438, 0.000549918), (0.000549918, 0.019992438))
            ThreePointArc((0.000549918, 0.019992438), (0.514497665, 0.00585565), (1.029223113, 0.019992438))
            Line((1.029223113, 0.019992438), (1.028673195, 0))
        make_face()
    chamfer4_piece_15a = extrude(amount=9.143365976, mode=Mode.PRIVATE)
    chamfer4_piece_15a = split(chamfer4_piece_15a, bisect_by=Plane(origin=(-13.170206373, 9, 12.670206373), z_dir=(0, -1, 0)), keep=Keep.TOP, mode=Mode.PRIVATE)
    with BuildSketch(Plane(origin=(-10.928317012, 9, 13), x_dir=(0, -0.9996219169112968, 0.027495876610585623), z_dir=(-1, 0, 0))) as chamfer4_piece_15b_section:
        with BuildLine():
            Line((1.028673195, 0), (-0.056547155, -1.027117794))
            Line((-0.056547155, -1.027117794), (-0.076539593, -1.026567876))
            ThreePointArc((-0.076539593, -1.026567876), (-0.034129227, -0.51339783), (-0.019992438, 0.000549918))
            Line((-0.019992438, 0.000549918), (0.000549918, 0.019992438))
            ThreePointArc((0.000549918, 0.019992438), (0.514497665, 0.00585565), (1.029223113, 0.019992438))
            Line((1.029223113, 0.019992438), (1.028673195, 0))
        make_face()
    chamfer4_piece_15b = extrude(amount=25.571682988, mode=Mode.PRIVATE)
    chamfer4_piece_15b = split(chamfer4_piece_15b, bisect_by=Plane(origin=(-13.5, 8.670206373, 12.670206373), z_dir=(1, 0, 0)), keep=Keep.TOP, mode=Mode.PRIVATE)
    chamfer4_piece_15 = chamfer4_piece_15a & chamfer4_piece_15b
    add(chamfer4_piece_15, mode=Mode.SUBTRACT)
    with BuildSketch(Plane(origin=(-36.5, 9, -13), x_dir=(0, 0.027495876610585647, 0.9996219169112968), z_dir=(1, 0, 0))) as chamfer4_piece_16a_section:
        with BuildLine():
            Line((1.028673195, 0), (-0.056547155, 1.027117794))
            Line((-0.056547155, 1.027117794), (-0.076539593, 1.026567876))
            ThreePointArc((-0.076539593, 1.026567876), (-0.034129227, 0.51339783), (-0.019992438, -0.000549918))
            Line((-0.019992438, -0.000549918), (0.000549918, -0.019992438))
            ThreePointArc((0.000549918, -0.019992438), (0.514497665, -0.00585565), (1.029223113, -0.019992438))
            Line((1.029223113, -0.019992438), (1.028673195, 0))
        make_face()
    chamfer4_piece_16a = extrude(amount=25.571682988, mode=Mode.PRIVATE)
    chamfer4_piece_16a = split(chamfer4_piece_16a, bisect_by=Plane(origin=(-13.5, 8.670206373, -12.670206373), z_dir=(1, 0, 0)), keep=Keep.TOP, mode=Mode.PRIVATE)
    with BuildSketch(Plane(origin=(-13.5, 15.571682988, -13), x_dir=(0.9996219169112968, 0, -0.027495876610585647), z_dir=(0, -1, 0))) as chamfer4_piece_16b_section:
        with BuildLine():
            Line((1.028673195, 0), (-0.056547155, 1.027117794))
            Line((-0.056547155, 1.027117794), (-0.076539593, 1.026567876))
            ThreePointArc((-0.076539593, 1.026567876), (-0.034129227, 0.51339783), (-0.019992438, -0.000549918))
            Line((-0.019992438, -0.000549918), (0.000549918, -0.019992438))
            ThreePointArc((0.000549918, -0.019992438), (0.514497665, -0.00585565), (1.029223113, -0.019992438))
            Line((1.029223113, -0.019992438), (1.028673195, 0))
        make_face()
    chamfer4_piece_16b = extrude(amount=9.143365976, mode=Mode.PRIVATE)
    chamfer4_piece_16b = split(chamfer4_piece_16b, bisect_by=Plane(origin=(-13.170206373, 9, -12.670206373), z_dir=(0, -1, 0)), keep=Keep.TOP, mode=Mode.PRIVATE)
    chamfer4_piece_16 = chamfer4_piece_16a & chamfer4_piece_16b
    add(chamfer4_piece_16, mode=Mode.SUBTRACT)

    # Sketch17 → Boss-Extrude9 (add)
    # profile 1 of 2: a face of its own
    with BuildSketch(Plane.XZ.offset(BOSS_EXTRUDE9_START)):
        with Locations((0, -9.5)):
            Circle(SKETCH17_R)
        with Locations(Location((0, -9.5, 0), (0, 0, 90))):
            Circle(SKETCH17_R_2, mode=Mode.SUBTRACT)
    # profile 2 of 2: a face of its own
    with BuildSketch(Plane.XZ.offset(BOSS_EXTRUDE9_START)):
        with Locations((0, 9.5)):
            Circle(SKETCH17_R)
        with Locations(Location((0, 9.5, 0), (0, 0, 90))):
            Circle(SKETCH17_R_2, mode=Mode.SUBTRACT)
    extrude(amount=BOSS_EXTRUDE9_DEPTH)

    # Fillet1
    # an asymmetric fillet: 5, 0.5 mm, written as the material it adds along each edge
    with BuildSketch(Plane(origin=(0, 8, -9.5), x_dir=(0, 0, 1), z_dir=(-1, 0, 0))) as fillet1_piece_1:
        with BuildLine():
            Bezier((2.8, FILLET1_SIZE), (2.8, 0), (2.8 - FILLET1_SIZE_2, 0), weights=[1, 0.707106781, 1])
            Line((2.8 - FILLET1_SIZE_2, 0), (2.8, 0))
            Line((2.8, 0), (2.8, FILLET1_SIZE))
        make_face()
    revolve(axis=Axis((0, 8, -9.5), (0, 1, 0)))
    # an asymmetric fillet: 5, 0.5 mm, written as the material it takes off along each edge
    with BuildSketch(Plane(origin=(0, 18, 9.5), x_dir=(0, 0, -1), z_dir=(1, 0, 0))) as fillet1_2_piece_1:
        with BuildLine():
            Bezier((2.7, -FILLET1_SIZE), (2.7, 0), (2.7 - FILLET1_SIZE_2, 0), weights=[1, 0.707106781, 1])
            Line((2.7 - FILLET1_SIZE_2, 0), (2.7, 0))
            Line((2.7, 0), (2.7, -FILLET1_SIZE))
        make_face()
    revolve(axis=Axis((0, 18, 9.5), (0, 1, 0)), mode=Mode.SUBTRACT)


solid = part.part
